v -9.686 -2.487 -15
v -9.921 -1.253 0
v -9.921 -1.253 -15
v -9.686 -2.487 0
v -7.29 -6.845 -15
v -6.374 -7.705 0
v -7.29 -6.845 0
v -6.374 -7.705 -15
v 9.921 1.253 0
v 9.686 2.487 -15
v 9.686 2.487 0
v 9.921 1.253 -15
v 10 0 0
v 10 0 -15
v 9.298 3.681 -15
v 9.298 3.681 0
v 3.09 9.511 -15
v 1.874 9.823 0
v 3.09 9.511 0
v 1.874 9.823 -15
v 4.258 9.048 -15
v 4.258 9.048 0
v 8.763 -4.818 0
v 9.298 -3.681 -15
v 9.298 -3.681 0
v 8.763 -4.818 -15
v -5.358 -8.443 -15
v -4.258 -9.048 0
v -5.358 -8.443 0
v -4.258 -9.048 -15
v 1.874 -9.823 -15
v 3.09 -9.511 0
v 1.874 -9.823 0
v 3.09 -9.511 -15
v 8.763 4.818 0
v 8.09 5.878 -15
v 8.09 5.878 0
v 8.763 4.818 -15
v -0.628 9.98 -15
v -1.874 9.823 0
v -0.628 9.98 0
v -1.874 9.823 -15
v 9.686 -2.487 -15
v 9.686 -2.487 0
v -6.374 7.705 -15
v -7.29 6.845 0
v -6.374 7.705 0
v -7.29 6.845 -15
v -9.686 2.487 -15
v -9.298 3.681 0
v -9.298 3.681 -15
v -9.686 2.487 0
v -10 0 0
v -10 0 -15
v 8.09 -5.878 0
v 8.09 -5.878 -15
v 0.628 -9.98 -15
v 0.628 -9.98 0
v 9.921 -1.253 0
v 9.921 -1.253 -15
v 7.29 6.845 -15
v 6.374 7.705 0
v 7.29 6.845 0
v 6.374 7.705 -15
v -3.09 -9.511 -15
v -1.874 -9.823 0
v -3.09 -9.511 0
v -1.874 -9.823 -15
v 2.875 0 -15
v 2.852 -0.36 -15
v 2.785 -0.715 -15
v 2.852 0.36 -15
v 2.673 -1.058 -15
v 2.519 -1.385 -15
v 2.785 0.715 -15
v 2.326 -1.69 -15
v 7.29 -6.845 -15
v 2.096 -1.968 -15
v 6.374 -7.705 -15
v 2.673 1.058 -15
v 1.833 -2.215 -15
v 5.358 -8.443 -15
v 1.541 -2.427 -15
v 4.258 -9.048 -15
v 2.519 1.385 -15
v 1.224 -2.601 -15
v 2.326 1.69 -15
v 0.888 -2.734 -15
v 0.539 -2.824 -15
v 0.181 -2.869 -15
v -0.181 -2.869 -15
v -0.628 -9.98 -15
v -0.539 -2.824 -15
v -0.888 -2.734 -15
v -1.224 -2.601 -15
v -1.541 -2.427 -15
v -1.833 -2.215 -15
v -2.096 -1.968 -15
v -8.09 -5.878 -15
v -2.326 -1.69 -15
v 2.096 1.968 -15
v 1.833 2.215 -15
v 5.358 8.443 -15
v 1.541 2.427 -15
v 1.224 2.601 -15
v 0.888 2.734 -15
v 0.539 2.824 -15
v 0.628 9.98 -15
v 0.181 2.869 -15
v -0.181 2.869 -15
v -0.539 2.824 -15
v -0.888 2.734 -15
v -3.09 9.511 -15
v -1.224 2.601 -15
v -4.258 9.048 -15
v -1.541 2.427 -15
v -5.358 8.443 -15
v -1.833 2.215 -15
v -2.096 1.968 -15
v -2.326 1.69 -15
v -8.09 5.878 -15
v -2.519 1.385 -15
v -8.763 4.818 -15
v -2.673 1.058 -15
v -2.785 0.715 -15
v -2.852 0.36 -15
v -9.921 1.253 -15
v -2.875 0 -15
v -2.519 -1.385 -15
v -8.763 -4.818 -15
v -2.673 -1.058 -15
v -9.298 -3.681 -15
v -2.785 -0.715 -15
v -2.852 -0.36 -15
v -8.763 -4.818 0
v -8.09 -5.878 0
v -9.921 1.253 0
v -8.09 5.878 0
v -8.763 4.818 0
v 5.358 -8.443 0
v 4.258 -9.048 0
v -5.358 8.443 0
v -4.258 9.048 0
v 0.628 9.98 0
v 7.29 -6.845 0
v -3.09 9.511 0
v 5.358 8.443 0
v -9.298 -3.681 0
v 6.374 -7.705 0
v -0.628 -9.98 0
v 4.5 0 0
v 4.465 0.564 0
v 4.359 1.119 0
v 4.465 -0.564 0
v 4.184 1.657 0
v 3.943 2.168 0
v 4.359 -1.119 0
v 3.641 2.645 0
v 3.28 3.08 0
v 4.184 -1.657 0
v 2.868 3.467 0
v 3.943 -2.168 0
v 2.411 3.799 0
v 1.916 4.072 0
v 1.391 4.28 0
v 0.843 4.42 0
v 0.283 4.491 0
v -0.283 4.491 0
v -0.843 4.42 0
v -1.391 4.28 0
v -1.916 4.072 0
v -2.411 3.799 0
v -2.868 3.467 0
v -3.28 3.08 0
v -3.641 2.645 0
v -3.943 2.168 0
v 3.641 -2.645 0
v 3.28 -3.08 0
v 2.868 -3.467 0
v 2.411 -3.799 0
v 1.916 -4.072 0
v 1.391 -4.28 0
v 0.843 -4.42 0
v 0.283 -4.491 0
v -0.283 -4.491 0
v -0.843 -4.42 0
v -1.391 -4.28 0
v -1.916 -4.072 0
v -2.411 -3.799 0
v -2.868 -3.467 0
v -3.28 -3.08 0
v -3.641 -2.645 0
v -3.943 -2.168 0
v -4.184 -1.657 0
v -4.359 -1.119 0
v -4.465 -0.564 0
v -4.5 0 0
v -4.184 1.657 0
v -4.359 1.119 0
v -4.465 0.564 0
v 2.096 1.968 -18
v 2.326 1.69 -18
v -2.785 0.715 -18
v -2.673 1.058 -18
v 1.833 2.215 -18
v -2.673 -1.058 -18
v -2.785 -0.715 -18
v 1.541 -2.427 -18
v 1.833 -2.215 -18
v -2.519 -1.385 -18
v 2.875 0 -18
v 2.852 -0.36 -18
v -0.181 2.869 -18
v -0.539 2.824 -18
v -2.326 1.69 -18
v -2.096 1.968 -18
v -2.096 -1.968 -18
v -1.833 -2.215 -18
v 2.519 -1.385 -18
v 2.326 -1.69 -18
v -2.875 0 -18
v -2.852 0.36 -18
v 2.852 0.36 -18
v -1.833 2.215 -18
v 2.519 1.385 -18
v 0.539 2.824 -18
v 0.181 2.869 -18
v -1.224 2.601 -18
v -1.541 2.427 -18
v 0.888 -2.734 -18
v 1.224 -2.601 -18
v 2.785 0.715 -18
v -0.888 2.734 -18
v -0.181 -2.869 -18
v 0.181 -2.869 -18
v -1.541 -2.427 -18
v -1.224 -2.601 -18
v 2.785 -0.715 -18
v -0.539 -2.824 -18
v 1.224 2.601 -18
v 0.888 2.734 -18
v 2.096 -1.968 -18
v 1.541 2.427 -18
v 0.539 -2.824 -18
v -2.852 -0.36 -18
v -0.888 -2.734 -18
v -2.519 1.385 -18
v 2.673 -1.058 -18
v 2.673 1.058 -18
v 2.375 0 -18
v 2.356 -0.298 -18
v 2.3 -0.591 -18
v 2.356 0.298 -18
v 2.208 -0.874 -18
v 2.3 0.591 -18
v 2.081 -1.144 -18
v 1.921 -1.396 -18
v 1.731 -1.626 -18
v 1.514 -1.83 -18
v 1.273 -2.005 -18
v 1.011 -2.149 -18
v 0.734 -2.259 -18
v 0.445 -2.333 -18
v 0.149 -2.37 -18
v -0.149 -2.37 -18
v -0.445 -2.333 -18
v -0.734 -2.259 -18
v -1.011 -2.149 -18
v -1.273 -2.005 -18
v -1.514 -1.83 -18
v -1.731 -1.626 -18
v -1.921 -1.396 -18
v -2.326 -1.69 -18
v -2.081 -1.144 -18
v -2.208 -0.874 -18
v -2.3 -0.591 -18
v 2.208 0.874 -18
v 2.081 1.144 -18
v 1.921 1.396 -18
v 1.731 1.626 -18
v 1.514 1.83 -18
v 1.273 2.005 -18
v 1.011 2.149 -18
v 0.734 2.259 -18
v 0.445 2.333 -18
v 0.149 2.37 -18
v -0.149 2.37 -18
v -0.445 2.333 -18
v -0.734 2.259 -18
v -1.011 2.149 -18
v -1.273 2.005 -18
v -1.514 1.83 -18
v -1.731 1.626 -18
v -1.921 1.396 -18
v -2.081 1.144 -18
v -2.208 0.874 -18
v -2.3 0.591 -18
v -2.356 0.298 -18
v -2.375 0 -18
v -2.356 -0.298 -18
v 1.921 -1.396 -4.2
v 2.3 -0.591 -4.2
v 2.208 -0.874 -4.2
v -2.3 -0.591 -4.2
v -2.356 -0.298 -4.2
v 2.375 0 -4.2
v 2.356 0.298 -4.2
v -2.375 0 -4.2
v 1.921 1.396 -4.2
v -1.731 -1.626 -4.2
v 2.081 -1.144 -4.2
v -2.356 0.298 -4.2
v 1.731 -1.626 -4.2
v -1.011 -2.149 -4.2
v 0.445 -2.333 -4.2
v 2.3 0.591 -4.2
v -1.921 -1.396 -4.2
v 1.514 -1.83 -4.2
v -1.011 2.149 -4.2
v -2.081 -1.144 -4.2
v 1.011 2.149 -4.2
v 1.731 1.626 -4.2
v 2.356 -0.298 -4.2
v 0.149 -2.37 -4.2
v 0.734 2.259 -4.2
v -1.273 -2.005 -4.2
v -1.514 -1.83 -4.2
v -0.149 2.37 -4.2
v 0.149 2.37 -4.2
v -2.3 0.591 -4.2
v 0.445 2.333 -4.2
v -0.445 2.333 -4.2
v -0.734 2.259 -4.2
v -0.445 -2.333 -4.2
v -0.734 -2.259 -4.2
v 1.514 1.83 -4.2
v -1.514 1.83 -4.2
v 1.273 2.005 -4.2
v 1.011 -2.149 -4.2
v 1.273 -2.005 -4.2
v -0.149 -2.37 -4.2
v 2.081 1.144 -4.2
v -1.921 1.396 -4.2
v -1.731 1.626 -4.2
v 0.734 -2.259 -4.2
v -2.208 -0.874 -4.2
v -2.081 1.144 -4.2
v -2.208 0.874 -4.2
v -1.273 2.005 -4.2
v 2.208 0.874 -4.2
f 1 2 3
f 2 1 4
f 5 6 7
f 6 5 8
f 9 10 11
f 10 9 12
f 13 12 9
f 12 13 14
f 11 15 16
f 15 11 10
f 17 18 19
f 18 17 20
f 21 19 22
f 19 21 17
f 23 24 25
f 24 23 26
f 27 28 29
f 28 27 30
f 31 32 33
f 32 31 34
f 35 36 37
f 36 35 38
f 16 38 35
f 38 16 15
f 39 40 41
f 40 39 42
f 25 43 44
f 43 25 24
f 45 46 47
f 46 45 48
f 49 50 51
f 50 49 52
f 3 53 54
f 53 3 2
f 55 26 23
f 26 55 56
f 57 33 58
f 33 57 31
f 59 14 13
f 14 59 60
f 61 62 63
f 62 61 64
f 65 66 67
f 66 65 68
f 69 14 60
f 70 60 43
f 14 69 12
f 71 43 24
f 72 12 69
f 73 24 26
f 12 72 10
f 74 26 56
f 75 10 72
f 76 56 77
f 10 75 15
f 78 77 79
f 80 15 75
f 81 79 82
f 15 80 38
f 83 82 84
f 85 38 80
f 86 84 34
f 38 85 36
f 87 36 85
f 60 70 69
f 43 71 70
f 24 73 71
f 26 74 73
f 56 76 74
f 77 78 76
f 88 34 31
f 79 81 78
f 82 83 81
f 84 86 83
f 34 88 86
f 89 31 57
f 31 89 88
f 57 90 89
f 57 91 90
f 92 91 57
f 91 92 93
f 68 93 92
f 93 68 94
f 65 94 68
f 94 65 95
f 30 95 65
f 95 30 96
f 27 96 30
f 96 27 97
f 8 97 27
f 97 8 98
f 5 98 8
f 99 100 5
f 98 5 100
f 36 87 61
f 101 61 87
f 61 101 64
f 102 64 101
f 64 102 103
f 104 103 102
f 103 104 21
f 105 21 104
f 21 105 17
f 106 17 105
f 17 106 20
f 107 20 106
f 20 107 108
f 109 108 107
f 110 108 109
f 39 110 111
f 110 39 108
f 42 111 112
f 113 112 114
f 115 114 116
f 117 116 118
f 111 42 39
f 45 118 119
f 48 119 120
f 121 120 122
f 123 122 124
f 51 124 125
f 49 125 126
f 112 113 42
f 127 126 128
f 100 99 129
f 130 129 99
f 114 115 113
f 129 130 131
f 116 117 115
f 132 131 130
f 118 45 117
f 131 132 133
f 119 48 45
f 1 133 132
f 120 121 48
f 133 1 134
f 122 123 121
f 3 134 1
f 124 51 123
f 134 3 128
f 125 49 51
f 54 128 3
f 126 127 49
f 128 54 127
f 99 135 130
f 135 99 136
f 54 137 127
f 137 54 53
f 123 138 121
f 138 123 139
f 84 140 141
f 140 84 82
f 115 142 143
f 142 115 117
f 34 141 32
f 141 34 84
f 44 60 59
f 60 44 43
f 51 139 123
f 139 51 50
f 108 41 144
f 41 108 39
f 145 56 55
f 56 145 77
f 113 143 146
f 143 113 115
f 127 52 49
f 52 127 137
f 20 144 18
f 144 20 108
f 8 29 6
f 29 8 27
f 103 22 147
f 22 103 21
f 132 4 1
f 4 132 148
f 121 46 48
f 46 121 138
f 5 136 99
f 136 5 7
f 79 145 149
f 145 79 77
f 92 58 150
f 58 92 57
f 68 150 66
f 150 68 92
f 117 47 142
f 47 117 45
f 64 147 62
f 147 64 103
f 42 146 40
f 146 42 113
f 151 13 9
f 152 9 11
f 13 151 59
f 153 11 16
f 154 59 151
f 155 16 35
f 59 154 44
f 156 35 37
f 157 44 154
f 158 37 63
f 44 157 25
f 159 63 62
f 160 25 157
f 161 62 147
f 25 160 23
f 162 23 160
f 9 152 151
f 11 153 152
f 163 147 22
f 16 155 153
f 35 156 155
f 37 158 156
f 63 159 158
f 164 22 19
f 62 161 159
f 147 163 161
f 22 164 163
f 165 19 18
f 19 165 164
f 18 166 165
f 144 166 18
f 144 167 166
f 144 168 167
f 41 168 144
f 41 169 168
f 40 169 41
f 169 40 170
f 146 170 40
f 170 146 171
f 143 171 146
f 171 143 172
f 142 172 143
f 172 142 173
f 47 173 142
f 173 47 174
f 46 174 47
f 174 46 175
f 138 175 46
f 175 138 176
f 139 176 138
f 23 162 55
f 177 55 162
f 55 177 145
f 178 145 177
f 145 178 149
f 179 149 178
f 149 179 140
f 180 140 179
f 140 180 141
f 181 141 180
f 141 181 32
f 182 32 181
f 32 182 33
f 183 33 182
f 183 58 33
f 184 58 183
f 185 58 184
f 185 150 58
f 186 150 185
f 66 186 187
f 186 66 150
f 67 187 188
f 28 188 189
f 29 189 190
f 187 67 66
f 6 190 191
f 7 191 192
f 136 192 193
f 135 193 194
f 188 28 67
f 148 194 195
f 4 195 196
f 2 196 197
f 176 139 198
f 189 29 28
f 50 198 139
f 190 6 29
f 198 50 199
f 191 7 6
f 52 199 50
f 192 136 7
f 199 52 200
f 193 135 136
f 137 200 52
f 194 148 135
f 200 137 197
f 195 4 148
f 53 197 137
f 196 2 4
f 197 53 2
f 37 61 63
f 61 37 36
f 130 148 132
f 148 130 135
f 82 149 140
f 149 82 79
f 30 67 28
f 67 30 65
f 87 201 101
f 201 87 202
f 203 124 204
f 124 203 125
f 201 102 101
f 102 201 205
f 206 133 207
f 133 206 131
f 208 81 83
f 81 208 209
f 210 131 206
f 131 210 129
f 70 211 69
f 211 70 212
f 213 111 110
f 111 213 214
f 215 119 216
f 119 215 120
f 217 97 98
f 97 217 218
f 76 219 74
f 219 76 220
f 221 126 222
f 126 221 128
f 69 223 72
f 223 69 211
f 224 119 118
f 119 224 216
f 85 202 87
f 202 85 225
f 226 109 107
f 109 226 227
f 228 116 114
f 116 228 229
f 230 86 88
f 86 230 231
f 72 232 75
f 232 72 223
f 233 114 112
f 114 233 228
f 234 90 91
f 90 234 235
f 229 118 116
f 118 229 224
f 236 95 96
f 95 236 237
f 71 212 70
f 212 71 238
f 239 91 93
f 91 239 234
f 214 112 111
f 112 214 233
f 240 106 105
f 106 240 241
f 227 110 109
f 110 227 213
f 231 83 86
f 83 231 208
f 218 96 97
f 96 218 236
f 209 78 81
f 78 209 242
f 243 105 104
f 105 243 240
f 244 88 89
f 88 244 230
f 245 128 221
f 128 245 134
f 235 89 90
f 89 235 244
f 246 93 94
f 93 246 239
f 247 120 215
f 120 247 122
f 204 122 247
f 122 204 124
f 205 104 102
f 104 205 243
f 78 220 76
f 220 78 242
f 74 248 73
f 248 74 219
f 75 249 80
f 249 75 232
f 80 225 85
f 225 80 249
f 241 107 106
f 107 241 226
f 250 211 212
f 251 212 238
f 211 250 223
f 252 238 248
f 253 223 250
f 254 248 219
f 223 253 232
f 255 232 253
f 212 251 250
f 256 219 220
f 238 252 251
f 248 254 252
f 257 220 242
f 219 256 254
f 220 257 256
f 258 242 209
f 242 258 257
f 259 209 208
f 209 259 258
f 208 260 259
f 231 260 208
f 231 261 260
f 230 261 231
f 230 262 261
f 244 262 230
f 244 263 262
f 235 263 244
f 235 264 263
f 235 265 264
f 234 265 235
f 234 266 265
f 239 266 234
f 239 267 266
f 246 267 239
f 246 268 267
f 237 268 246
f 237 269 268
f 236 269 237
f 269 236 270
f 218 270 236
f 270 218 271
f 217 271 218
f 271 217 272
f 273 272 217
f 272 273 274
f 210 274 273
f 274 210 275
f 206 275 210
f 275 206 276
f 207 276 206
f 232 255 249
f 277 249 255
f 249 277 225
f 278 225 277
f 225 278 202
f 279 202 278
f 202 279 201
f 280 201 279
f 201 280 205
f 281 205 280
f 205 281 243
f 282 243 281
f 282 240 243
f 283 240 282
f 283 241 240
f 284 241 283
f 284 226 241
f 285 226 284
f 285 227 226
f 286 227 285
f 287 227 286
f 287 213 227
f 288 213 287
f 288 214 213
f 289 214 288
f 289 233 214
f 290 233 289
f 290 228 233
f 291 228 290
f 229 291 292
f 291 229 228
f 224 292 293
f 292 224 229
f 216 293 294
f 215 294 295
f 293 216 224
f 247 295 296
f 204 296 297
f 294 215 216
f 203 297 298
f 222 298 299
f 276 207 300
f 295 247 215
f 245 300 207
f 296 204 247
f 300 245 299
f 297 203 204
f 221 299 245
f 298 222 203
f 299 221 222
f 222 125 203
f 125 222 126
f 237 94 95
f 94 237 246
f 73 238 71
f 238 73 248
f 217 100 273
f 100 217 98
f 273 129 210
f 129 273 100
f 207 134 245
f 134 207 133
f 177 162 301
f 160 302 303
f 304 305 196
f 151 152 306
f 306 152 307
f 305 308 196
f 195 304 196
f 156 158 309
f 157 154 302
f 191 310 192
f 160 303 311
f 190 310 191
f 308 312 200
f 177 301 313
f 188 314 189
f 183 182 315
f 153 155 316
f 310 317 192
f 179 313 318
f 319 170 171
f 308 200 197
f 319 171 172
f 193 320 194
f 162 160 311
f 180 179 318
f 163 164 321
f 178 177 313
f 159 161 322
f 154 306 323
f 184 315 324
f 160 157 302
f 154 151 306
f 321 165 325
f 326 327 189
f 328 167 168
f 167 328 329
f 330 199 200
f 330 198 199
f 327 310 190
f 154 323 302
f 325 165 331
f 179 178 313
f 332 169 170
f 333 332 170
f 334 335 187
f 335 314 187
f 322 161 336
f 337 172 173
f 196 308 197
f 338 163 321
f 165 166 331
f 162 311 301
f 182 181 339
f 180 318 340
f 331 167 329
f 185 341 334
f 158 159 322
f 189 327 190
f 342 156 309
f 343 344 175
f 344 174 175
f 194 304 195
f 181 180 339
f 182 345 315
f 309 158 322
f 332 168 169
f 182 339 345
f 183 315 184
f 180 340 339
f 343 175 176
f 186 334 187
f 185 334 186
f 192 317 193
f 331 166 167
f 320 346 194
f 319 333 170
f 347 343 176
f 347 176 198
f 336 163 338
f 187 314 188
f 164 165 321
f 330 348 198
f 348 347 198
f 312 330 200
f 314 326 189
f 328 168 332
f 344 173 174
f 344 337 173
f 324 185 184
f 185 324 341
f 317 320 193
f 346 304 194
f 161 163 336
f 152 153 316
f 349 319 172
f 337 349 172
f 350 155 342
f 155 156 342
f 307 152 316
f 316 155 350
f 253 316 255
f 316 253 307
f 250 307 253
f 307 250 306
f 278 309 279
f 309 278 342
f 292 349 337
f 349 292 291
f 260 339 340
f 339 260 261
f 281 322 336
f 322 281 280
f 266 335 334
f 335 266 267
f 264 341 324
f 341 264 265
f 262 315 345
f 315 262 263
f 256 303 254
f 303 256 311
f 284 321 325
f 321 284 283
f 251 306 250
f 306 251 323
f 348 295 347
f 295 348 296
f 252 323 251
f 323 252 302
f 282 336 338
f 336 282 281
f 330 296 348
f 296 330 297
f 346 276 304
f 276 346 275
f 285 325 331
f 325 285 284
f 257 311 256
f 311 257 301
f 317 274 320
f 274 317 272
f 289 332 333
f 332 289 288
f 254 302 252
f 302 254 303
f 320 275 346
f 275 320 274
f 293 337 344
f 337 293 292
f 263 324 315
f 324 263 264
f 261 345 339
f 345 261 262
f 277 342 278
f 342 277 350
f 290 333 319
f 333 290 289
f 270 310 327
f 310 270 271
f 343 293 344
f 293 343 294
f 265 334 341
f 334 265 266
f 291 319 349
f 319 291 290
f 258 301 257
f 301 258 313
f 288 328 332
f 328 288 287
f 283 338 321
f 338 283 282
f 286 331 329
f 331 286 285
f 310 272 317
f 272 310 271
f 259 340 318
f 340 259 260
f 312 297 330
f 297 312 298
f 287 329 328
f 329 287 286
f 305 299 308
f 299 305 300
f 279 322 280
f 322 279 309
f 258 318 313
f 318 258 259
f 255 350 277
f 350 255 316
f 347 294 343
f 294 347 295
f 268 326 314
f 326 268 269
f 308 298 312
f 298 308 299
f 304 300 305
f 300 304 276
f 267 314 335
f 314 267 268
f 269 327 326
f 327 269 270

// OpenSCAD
$fn = 50;

difference() {
	union() {
		translate(v = [0, 0, -15.0]) {
			cylinder(h = 15, r = 10.0);
		}
		#translate(v = [0, 0, -18.0]) {
			cylinder(h = 18, r = 2.875);
		}
	}
	union() {
		translate(v = [0, 0, 0]) {
			rotate(a = [0, 0, 0]) {
				difference() {
					union() {
						translate(v = [0, 0, -18.0]) {
							cylinder(h = 18, r = 2.25);
						}
						translate(v = [0, 0, -4.2]) {
							cylinder(h = 4.2, r1 = 2.375, r2 = 4.5);
						}
						translate(v = [0, 0, -18.0]) {
							cylinder(h = 18, r = 2.375);
						}
						translate(v = [0, 0, -18.0]) {
							cylinder(h = 18, r = 2.25);
						}
					}
					union();
				}
			}
		}
	}
}
